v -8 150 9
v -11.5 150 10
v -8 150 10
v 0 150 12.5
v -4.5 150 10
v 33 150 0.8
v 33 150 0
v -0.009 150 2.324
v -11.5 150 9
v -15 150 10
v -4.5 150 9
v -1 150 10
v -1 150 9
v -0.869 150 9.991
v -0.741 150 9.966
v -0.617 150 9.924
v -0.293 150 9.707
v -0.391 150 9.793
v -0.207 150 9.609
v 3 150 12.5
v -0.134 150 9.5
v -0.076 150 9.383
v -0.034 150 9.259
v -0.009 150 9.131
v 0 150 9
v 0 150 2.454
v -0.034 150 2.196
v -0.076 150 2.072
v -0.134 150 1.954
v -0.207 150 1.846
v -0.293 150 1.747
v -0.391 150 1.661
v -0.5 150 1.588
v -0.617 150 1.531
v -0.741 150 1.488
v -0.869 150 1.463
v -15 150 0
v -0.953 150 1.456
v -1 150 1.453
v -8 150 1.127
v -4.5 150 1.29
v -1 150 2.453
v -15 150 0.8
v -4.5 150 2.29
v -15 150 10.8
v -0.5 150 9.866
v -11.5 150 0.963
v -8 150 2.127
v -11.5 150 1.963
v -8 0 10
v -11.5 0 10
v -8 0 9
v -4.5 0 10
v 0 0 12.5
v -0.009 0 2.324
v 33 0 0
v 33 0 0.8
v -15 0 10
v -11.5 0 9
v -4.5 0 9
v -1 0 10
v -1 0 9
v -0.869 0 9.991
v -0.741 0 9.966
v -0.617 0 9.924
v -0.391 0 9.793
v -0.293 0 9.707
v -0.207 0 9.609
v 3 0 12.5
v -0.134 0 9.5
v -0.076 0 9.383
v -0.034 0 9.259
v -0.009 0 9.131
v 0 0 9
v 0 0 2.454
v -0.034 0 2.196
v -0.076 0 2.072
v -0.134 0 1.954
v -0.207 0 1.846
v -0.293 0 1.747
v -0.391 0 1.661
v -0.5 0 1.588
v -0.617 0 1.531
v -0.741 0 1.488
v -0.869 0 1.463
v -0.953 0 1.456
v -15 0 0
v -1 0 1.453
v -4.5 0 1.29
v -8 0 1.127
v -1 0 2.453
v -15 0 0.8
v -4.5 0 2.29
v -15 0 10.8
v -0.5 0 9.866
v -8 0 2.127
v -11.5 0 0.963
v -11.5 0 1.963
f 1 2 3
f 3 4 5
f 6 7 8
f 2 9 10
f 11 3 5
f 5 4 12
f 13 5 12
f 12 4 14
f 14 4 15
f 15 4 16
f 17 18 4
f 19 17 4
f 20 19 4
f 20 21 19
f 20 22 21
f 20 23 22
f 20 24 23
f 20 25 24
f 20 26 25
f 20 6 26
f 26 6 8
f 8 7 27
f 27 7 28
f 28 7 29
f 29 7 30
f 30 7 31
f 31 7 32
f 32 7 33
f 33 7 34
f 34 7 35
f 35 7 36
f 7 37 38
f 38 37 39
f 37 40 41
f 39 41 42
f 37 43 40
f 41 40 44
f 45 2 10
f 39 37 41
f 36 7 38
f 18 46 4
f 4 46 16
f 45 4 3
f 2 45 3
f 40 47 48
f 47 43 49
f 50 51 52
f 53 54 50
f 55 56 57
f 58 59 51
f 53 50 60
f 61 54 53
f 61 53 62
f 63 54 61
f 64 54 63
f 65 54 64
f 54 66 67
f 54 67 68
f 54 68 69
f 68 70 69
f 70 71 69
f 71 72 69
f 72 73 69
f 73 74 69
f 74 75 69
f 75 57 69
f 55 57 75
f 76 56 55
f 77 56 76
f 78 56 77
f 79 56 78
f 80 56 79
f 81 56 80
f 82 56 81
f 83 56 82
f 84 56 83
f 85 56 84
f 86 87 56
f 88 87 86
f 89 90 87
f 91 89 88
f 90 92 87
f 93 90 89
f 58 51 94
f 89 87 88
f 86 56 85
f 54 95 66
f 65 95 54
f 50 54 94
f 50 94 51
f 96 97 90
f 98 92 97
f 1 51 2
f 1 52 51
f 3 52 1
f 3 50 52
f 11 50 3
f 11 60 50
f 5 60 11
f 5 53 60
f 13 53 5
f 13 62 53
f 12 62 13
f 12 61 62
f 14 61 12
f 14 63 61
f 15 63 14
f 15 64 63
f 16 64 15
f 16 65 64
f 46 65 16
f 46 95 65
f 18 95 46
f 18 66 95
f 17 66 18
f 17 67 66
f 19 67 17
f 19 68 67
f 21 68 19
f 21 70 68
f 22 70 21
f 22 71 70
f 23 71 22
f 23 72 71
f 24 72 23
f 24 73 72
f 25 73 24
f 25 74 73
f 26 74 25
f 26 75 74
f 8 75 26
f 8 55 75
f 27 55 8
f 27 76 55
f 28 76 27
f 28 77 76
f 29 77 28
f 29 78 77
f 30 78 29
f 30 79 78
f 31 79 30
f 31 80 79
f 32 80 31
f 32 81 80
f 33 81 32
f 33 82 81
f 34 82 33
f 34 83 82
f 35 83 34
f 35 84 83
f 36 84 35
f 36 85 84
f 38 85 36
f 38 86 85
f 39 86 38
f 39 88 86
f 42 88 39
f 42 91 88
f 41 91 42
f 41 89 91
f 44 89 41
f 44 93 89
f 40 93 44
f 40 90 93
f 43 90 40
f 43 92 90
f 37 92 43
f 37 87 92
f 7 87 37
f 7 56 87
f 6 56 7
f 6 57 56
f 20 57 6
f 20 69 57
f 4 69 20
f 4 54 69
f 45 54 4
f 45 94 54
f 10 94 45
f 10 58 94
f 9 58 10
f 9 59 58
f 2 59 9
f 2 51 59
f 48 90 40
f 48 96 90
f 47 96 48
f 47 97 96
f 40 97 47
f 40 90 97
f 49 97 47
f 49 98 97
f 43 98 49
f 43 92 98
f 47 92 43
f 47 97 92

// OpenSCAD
//Teppichrandleiste
//Abschlussschiene fuer einen Teppich, der auf einem anderen Boden (Laminat, Fliesen, Parkett ...) aufliegt.
//Ohne Schrauben: die Teppichkante wird in einen Schlitz gesteckt und von Widerhaken gehalten,
//auf der anderen Seite laeuft eine Rampe flach auf den Boden aus.
//
//Querschnitt (Blick auf die Stirnseite, x quer zur Schiene, z nach oben):
//
//      Teppichseite                    Bodenseite
//                   ______
//      ____Lippe___/      |\__
//     |  v v v v v        |   \___
//     |   Schlitz         |       \___  Rampe
//     |__^_^_^_^_^__      |           \___
//          Zunge     \____|_______________|
//  =================================================  z=0 (Boden)
//   x=-tiefe_schlitz     x=0  x=wand            x=wand+l_rampe

/* [Allgemein] */

//Laenge der Schiene (beim Drucken auf der Stirnseite = Druckhoehe)
laenge=150;

//Ansicht: false = Einbaulage, true = auf die Stirnseite gedreht zum Drucken
druck=false;

/* [Teppich] */

//Dicke des Teppichs
h_teppich=10;
//Um so viel wird der Teppich im Schlitz zusammengedrueckt
klemmung=1.5;
//Wie tief der Teppich in den Schlitz gesteckt wird
tiefe_schlitz=15;

/* [Profil] */

//Dicke der Zunge unter dem Teppich an der Rueckwand (laeuft zur Spitze hin duenn aus)
d_zunge=1.5;
//Materialstaerke der Lippe ueber dem Teppich an der Rueckwand
d_oben=2.5;
//Dicke der Rueckwand des Schlitzes
wand=3;
//Laenge der Rampe auf dem Boden (laenger = flacher, weniger Stolpergefahr)
l_rampe=30;
//Dicke der auslaufenden Kanten an Lippe, Zunge und Rampe (fuer den Drucker nicht zu duenn)
kante=0.8;
//Rundung der Innenecken im Schlitz (0 = aus)
r_innen=1;

/* [Widerhaken im Schlitz] */

//Widerhaken an der Unterseite der Lippe
haken_oben=true;
//Widerhaken auf der Oberseite der Zunge
haken_unten=true;
//Hoehe der Widerhaken
h_haken=1;
//Anzahl Widerhaken je Seite
n_haken=4;

$fn=48;

//Hoehe des Schlitzes an der Rueckwand
h_schlitz=h_teppich-klemmung;
//Unterkante der Lippe
z_lippe=d_zunge+h_schlitz;
//Hoechster Punkt der Schiene
z_top=z_lippe+d_oben;

assert(h_schlitz-(haken_oben?h_haken:0)-(haken_unten?h_haken:0)>1,
       "Schlitz zu eng fuer die Widerhaken");
assert(d_zunge>=kante, "Zunge duenner als die Mindestkante");

//Oberseite der Zunge an Stelle x (laeuft von kante an der Spitze auf d_zunge an der Rueckwand)
function z_zunge(x)=kante+(d_zunge-kante)*(x+tiefe_schlitz)/tiefe_schlitz;

module profil_grund()
{
    polygon([
        //Zunge, Spitze
        [-tiefe_schlitz, 0],
        [-tiefe_schlitz, kante],
        //Schlitzboden bis Rueckwand
        [0, d_zunge],
        //Rueckwand des Schlitzes
        [0, z_lippe],
        //Lippe, Spitze
        [-tiefe_schlitz, z_lippe],
        [-tiefe_schlitz, z_lippe+kante],
        //Oberseite
        [0, z_top],
        [wand, z_top],
        //Rampe, Spitze
        [wand+l_rampe, kante],
        [wand+l_rampe, 0],
    ]);
}

//Saegezaehne: flach ansteigend in Steckrichtung (+x), steile Flanke zur Rueckwand hin,
//so rutscht der Teppich leicht hinein, aber schwer wieder heraus
module haken()
{
    bk=(tiefe_schlitz-r_innen)/n_haken;
    for (i=[0:n_haken-1])
    {
        x0=-tiefe_schlitz+i*bk;
        x1=x0+bk;
        if (haken_oben)
            polygon([[x0, z_lippe], [x1, z_lippe], [x1, z_lippe-h_haken]]);
        if (haken_unten)
            polygon([[x0, z_zunge(x0)], [x1, z_zunge(x1)], [x1, z_zunge(x1)+h_haken]]);
    }
}

module profil()
{
    //Innenecken ausrunden, Aussenmasse bleiben gleich
    if (r_innen>0)
        offset(r=-r_innen) offset(delta=r_innen) profil_grund();
    else
        profil_grund();

    if (n_haken>0) haken();
}

module schiene()
{
    //Profil entlang y extrudieren
    rotate([90,0,0]) translate([0,0,-laenge]) linear_extrude(height=laenge) profil();
}

if (druck)
    //Auf die Stirnseite stellen: Profil liegt auf dem Druckbett, keine Ueberhaenge
    rotate([-90,0,0]) translate([0,-laenge,0]) schiene();
else
    schiene();
